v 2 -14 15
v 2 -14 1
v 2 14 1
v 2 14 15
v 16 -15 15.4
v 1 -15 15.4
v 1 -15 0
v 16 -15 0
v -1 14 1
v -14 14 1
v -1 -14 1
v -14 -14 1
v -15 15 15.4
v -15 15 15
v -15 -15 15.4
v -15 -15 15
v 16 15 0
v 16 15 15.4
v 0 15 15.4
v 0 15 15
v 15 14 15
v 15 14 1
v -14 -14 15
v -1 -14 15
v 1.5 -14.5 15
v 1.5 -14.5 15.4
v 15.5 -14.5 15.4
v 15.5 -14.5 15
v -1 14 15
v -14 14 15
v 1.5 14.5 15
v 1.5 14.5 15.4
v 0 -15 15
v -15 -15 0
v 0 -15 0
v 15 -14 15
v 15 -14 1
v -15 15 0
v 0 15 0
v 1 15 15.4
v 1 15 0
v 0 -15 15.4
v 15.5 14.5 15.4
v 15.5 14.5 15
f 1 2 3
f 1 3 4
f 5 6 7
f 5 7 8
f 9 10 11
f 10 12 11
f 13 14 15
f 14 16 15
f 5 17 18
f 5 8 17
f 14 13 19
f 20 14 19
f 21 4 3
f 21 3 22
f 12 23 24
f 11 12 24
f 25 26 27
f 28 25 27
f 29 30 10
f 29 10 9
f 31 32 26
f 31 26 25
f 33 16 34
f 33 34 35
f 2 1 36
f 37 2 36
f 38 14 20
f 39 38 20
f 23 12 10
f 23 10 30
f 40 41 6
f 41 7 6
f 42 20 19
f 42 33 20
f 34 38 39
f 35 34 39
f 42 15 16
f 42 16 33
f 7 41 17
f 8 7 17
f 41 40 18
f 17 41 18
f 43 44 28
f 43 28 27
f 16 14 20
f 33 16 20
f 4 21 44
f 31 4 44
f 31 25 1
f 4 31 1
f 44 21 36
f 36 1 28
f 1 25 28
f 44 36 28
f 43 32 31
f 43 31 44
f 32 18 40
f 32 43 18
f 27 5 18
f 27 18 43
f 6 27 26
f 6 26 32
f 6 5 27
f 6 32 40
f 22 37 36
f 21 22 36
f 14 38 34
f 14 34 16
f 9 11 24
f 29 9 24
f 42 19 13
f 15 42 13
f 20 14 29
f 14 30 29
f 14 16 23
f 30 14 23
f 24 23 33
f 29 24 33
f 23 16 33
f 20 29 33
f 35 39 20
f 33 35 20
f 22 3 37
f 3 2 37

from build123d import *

# Parameters (mm, degrees)
F0_W     = 15
F0_H     = 15
F1_DEPTH = 15
F2_DEPTH = 15
F4_T     = -1
F5_T     = -1
F3_W     = 0.5
F3_H     = 0.4
F6_DEPTH = 15
F7_DEPTH = 14.5


with BuildPart() as f1:
    # F0 (on Front) → F1 (new body, symmetric)
    with BuildSketch(Plane.XZ):
        with Locations((8.5, 7.5)):
            Rectangle(F0_W, F0_H)
    extrude(amount=F1_DEPTH, both=True)

    # F4
    f4_openings = [f1.faces().sort_by_distance(p)[0] for p in [
        (8.5, 0, 15),
    ]]
    offset(amount=F4_T, openings=f4_openings)

    # F3 (on Front) → F6 (join, symmetric)
    with BuildSketch(Plane.XZ):
        with Locations((1.25, 15.2)):
            Rectangle(F3_W, F3_H)
        with Locations((15.75, 15.2)):
            Rectangle(F3_W, F3_H)
        Polygon((15.5, 15.4), (1.5, 15.4), (1.5, 15), (3, 15), (15.5, 15), align=None)
    extrude(amount=F6_DEPTH, both=True)

    # F3 (on Front) → F7 (cut, symmetric)
    with BuildSketch(Plane.XZ):
        Polygon((15.5, 15.4), (1.5, 15.4), (1.5, 15), (3, 15), (15.5, 15), align=None)
    extrude(amount=F7_DEPTH, both=True, mode=Mode.SUBTRACT)


with BuildPart() as f2:
    # F0 (on Front) → F2 (new body, symmetric)
    with BuildSketch(Plane.XZ):
        with Locations((-7.5, 7.5)):
            Rectangle(F0_W, F0_H)
    extrude(amount=F2_DEPTH, both=True)

    # F5
    f5_openings = [f2.faces().sort_by_distance(p)[0] for p in [
        (-7.5, 0, 15),
    ]]
    offset(amount=F5_T, openings=f5_openings)


with BuildPart() as f6:
    # F3 (on Front) → F6, piece 2 (new body, symmetric)
    with BuildSketch(Plane.XZ):
        with Locations((-0.25, 15.2)):
            Rectangle(F3_W, F3_H)
        with Locations((-14.75, 15.2)):
            Rectangle(F3_W, F3_H)
        Polygon((-14.5, 15), (-2, 15), (-0.5, 15), (-0.5, 15.4), (-14.5, 15.4), align=None)
    extrude(amount=F6_DEPTH, both=True)


solid = Compound([f1.part, f2.part, f6.part])
